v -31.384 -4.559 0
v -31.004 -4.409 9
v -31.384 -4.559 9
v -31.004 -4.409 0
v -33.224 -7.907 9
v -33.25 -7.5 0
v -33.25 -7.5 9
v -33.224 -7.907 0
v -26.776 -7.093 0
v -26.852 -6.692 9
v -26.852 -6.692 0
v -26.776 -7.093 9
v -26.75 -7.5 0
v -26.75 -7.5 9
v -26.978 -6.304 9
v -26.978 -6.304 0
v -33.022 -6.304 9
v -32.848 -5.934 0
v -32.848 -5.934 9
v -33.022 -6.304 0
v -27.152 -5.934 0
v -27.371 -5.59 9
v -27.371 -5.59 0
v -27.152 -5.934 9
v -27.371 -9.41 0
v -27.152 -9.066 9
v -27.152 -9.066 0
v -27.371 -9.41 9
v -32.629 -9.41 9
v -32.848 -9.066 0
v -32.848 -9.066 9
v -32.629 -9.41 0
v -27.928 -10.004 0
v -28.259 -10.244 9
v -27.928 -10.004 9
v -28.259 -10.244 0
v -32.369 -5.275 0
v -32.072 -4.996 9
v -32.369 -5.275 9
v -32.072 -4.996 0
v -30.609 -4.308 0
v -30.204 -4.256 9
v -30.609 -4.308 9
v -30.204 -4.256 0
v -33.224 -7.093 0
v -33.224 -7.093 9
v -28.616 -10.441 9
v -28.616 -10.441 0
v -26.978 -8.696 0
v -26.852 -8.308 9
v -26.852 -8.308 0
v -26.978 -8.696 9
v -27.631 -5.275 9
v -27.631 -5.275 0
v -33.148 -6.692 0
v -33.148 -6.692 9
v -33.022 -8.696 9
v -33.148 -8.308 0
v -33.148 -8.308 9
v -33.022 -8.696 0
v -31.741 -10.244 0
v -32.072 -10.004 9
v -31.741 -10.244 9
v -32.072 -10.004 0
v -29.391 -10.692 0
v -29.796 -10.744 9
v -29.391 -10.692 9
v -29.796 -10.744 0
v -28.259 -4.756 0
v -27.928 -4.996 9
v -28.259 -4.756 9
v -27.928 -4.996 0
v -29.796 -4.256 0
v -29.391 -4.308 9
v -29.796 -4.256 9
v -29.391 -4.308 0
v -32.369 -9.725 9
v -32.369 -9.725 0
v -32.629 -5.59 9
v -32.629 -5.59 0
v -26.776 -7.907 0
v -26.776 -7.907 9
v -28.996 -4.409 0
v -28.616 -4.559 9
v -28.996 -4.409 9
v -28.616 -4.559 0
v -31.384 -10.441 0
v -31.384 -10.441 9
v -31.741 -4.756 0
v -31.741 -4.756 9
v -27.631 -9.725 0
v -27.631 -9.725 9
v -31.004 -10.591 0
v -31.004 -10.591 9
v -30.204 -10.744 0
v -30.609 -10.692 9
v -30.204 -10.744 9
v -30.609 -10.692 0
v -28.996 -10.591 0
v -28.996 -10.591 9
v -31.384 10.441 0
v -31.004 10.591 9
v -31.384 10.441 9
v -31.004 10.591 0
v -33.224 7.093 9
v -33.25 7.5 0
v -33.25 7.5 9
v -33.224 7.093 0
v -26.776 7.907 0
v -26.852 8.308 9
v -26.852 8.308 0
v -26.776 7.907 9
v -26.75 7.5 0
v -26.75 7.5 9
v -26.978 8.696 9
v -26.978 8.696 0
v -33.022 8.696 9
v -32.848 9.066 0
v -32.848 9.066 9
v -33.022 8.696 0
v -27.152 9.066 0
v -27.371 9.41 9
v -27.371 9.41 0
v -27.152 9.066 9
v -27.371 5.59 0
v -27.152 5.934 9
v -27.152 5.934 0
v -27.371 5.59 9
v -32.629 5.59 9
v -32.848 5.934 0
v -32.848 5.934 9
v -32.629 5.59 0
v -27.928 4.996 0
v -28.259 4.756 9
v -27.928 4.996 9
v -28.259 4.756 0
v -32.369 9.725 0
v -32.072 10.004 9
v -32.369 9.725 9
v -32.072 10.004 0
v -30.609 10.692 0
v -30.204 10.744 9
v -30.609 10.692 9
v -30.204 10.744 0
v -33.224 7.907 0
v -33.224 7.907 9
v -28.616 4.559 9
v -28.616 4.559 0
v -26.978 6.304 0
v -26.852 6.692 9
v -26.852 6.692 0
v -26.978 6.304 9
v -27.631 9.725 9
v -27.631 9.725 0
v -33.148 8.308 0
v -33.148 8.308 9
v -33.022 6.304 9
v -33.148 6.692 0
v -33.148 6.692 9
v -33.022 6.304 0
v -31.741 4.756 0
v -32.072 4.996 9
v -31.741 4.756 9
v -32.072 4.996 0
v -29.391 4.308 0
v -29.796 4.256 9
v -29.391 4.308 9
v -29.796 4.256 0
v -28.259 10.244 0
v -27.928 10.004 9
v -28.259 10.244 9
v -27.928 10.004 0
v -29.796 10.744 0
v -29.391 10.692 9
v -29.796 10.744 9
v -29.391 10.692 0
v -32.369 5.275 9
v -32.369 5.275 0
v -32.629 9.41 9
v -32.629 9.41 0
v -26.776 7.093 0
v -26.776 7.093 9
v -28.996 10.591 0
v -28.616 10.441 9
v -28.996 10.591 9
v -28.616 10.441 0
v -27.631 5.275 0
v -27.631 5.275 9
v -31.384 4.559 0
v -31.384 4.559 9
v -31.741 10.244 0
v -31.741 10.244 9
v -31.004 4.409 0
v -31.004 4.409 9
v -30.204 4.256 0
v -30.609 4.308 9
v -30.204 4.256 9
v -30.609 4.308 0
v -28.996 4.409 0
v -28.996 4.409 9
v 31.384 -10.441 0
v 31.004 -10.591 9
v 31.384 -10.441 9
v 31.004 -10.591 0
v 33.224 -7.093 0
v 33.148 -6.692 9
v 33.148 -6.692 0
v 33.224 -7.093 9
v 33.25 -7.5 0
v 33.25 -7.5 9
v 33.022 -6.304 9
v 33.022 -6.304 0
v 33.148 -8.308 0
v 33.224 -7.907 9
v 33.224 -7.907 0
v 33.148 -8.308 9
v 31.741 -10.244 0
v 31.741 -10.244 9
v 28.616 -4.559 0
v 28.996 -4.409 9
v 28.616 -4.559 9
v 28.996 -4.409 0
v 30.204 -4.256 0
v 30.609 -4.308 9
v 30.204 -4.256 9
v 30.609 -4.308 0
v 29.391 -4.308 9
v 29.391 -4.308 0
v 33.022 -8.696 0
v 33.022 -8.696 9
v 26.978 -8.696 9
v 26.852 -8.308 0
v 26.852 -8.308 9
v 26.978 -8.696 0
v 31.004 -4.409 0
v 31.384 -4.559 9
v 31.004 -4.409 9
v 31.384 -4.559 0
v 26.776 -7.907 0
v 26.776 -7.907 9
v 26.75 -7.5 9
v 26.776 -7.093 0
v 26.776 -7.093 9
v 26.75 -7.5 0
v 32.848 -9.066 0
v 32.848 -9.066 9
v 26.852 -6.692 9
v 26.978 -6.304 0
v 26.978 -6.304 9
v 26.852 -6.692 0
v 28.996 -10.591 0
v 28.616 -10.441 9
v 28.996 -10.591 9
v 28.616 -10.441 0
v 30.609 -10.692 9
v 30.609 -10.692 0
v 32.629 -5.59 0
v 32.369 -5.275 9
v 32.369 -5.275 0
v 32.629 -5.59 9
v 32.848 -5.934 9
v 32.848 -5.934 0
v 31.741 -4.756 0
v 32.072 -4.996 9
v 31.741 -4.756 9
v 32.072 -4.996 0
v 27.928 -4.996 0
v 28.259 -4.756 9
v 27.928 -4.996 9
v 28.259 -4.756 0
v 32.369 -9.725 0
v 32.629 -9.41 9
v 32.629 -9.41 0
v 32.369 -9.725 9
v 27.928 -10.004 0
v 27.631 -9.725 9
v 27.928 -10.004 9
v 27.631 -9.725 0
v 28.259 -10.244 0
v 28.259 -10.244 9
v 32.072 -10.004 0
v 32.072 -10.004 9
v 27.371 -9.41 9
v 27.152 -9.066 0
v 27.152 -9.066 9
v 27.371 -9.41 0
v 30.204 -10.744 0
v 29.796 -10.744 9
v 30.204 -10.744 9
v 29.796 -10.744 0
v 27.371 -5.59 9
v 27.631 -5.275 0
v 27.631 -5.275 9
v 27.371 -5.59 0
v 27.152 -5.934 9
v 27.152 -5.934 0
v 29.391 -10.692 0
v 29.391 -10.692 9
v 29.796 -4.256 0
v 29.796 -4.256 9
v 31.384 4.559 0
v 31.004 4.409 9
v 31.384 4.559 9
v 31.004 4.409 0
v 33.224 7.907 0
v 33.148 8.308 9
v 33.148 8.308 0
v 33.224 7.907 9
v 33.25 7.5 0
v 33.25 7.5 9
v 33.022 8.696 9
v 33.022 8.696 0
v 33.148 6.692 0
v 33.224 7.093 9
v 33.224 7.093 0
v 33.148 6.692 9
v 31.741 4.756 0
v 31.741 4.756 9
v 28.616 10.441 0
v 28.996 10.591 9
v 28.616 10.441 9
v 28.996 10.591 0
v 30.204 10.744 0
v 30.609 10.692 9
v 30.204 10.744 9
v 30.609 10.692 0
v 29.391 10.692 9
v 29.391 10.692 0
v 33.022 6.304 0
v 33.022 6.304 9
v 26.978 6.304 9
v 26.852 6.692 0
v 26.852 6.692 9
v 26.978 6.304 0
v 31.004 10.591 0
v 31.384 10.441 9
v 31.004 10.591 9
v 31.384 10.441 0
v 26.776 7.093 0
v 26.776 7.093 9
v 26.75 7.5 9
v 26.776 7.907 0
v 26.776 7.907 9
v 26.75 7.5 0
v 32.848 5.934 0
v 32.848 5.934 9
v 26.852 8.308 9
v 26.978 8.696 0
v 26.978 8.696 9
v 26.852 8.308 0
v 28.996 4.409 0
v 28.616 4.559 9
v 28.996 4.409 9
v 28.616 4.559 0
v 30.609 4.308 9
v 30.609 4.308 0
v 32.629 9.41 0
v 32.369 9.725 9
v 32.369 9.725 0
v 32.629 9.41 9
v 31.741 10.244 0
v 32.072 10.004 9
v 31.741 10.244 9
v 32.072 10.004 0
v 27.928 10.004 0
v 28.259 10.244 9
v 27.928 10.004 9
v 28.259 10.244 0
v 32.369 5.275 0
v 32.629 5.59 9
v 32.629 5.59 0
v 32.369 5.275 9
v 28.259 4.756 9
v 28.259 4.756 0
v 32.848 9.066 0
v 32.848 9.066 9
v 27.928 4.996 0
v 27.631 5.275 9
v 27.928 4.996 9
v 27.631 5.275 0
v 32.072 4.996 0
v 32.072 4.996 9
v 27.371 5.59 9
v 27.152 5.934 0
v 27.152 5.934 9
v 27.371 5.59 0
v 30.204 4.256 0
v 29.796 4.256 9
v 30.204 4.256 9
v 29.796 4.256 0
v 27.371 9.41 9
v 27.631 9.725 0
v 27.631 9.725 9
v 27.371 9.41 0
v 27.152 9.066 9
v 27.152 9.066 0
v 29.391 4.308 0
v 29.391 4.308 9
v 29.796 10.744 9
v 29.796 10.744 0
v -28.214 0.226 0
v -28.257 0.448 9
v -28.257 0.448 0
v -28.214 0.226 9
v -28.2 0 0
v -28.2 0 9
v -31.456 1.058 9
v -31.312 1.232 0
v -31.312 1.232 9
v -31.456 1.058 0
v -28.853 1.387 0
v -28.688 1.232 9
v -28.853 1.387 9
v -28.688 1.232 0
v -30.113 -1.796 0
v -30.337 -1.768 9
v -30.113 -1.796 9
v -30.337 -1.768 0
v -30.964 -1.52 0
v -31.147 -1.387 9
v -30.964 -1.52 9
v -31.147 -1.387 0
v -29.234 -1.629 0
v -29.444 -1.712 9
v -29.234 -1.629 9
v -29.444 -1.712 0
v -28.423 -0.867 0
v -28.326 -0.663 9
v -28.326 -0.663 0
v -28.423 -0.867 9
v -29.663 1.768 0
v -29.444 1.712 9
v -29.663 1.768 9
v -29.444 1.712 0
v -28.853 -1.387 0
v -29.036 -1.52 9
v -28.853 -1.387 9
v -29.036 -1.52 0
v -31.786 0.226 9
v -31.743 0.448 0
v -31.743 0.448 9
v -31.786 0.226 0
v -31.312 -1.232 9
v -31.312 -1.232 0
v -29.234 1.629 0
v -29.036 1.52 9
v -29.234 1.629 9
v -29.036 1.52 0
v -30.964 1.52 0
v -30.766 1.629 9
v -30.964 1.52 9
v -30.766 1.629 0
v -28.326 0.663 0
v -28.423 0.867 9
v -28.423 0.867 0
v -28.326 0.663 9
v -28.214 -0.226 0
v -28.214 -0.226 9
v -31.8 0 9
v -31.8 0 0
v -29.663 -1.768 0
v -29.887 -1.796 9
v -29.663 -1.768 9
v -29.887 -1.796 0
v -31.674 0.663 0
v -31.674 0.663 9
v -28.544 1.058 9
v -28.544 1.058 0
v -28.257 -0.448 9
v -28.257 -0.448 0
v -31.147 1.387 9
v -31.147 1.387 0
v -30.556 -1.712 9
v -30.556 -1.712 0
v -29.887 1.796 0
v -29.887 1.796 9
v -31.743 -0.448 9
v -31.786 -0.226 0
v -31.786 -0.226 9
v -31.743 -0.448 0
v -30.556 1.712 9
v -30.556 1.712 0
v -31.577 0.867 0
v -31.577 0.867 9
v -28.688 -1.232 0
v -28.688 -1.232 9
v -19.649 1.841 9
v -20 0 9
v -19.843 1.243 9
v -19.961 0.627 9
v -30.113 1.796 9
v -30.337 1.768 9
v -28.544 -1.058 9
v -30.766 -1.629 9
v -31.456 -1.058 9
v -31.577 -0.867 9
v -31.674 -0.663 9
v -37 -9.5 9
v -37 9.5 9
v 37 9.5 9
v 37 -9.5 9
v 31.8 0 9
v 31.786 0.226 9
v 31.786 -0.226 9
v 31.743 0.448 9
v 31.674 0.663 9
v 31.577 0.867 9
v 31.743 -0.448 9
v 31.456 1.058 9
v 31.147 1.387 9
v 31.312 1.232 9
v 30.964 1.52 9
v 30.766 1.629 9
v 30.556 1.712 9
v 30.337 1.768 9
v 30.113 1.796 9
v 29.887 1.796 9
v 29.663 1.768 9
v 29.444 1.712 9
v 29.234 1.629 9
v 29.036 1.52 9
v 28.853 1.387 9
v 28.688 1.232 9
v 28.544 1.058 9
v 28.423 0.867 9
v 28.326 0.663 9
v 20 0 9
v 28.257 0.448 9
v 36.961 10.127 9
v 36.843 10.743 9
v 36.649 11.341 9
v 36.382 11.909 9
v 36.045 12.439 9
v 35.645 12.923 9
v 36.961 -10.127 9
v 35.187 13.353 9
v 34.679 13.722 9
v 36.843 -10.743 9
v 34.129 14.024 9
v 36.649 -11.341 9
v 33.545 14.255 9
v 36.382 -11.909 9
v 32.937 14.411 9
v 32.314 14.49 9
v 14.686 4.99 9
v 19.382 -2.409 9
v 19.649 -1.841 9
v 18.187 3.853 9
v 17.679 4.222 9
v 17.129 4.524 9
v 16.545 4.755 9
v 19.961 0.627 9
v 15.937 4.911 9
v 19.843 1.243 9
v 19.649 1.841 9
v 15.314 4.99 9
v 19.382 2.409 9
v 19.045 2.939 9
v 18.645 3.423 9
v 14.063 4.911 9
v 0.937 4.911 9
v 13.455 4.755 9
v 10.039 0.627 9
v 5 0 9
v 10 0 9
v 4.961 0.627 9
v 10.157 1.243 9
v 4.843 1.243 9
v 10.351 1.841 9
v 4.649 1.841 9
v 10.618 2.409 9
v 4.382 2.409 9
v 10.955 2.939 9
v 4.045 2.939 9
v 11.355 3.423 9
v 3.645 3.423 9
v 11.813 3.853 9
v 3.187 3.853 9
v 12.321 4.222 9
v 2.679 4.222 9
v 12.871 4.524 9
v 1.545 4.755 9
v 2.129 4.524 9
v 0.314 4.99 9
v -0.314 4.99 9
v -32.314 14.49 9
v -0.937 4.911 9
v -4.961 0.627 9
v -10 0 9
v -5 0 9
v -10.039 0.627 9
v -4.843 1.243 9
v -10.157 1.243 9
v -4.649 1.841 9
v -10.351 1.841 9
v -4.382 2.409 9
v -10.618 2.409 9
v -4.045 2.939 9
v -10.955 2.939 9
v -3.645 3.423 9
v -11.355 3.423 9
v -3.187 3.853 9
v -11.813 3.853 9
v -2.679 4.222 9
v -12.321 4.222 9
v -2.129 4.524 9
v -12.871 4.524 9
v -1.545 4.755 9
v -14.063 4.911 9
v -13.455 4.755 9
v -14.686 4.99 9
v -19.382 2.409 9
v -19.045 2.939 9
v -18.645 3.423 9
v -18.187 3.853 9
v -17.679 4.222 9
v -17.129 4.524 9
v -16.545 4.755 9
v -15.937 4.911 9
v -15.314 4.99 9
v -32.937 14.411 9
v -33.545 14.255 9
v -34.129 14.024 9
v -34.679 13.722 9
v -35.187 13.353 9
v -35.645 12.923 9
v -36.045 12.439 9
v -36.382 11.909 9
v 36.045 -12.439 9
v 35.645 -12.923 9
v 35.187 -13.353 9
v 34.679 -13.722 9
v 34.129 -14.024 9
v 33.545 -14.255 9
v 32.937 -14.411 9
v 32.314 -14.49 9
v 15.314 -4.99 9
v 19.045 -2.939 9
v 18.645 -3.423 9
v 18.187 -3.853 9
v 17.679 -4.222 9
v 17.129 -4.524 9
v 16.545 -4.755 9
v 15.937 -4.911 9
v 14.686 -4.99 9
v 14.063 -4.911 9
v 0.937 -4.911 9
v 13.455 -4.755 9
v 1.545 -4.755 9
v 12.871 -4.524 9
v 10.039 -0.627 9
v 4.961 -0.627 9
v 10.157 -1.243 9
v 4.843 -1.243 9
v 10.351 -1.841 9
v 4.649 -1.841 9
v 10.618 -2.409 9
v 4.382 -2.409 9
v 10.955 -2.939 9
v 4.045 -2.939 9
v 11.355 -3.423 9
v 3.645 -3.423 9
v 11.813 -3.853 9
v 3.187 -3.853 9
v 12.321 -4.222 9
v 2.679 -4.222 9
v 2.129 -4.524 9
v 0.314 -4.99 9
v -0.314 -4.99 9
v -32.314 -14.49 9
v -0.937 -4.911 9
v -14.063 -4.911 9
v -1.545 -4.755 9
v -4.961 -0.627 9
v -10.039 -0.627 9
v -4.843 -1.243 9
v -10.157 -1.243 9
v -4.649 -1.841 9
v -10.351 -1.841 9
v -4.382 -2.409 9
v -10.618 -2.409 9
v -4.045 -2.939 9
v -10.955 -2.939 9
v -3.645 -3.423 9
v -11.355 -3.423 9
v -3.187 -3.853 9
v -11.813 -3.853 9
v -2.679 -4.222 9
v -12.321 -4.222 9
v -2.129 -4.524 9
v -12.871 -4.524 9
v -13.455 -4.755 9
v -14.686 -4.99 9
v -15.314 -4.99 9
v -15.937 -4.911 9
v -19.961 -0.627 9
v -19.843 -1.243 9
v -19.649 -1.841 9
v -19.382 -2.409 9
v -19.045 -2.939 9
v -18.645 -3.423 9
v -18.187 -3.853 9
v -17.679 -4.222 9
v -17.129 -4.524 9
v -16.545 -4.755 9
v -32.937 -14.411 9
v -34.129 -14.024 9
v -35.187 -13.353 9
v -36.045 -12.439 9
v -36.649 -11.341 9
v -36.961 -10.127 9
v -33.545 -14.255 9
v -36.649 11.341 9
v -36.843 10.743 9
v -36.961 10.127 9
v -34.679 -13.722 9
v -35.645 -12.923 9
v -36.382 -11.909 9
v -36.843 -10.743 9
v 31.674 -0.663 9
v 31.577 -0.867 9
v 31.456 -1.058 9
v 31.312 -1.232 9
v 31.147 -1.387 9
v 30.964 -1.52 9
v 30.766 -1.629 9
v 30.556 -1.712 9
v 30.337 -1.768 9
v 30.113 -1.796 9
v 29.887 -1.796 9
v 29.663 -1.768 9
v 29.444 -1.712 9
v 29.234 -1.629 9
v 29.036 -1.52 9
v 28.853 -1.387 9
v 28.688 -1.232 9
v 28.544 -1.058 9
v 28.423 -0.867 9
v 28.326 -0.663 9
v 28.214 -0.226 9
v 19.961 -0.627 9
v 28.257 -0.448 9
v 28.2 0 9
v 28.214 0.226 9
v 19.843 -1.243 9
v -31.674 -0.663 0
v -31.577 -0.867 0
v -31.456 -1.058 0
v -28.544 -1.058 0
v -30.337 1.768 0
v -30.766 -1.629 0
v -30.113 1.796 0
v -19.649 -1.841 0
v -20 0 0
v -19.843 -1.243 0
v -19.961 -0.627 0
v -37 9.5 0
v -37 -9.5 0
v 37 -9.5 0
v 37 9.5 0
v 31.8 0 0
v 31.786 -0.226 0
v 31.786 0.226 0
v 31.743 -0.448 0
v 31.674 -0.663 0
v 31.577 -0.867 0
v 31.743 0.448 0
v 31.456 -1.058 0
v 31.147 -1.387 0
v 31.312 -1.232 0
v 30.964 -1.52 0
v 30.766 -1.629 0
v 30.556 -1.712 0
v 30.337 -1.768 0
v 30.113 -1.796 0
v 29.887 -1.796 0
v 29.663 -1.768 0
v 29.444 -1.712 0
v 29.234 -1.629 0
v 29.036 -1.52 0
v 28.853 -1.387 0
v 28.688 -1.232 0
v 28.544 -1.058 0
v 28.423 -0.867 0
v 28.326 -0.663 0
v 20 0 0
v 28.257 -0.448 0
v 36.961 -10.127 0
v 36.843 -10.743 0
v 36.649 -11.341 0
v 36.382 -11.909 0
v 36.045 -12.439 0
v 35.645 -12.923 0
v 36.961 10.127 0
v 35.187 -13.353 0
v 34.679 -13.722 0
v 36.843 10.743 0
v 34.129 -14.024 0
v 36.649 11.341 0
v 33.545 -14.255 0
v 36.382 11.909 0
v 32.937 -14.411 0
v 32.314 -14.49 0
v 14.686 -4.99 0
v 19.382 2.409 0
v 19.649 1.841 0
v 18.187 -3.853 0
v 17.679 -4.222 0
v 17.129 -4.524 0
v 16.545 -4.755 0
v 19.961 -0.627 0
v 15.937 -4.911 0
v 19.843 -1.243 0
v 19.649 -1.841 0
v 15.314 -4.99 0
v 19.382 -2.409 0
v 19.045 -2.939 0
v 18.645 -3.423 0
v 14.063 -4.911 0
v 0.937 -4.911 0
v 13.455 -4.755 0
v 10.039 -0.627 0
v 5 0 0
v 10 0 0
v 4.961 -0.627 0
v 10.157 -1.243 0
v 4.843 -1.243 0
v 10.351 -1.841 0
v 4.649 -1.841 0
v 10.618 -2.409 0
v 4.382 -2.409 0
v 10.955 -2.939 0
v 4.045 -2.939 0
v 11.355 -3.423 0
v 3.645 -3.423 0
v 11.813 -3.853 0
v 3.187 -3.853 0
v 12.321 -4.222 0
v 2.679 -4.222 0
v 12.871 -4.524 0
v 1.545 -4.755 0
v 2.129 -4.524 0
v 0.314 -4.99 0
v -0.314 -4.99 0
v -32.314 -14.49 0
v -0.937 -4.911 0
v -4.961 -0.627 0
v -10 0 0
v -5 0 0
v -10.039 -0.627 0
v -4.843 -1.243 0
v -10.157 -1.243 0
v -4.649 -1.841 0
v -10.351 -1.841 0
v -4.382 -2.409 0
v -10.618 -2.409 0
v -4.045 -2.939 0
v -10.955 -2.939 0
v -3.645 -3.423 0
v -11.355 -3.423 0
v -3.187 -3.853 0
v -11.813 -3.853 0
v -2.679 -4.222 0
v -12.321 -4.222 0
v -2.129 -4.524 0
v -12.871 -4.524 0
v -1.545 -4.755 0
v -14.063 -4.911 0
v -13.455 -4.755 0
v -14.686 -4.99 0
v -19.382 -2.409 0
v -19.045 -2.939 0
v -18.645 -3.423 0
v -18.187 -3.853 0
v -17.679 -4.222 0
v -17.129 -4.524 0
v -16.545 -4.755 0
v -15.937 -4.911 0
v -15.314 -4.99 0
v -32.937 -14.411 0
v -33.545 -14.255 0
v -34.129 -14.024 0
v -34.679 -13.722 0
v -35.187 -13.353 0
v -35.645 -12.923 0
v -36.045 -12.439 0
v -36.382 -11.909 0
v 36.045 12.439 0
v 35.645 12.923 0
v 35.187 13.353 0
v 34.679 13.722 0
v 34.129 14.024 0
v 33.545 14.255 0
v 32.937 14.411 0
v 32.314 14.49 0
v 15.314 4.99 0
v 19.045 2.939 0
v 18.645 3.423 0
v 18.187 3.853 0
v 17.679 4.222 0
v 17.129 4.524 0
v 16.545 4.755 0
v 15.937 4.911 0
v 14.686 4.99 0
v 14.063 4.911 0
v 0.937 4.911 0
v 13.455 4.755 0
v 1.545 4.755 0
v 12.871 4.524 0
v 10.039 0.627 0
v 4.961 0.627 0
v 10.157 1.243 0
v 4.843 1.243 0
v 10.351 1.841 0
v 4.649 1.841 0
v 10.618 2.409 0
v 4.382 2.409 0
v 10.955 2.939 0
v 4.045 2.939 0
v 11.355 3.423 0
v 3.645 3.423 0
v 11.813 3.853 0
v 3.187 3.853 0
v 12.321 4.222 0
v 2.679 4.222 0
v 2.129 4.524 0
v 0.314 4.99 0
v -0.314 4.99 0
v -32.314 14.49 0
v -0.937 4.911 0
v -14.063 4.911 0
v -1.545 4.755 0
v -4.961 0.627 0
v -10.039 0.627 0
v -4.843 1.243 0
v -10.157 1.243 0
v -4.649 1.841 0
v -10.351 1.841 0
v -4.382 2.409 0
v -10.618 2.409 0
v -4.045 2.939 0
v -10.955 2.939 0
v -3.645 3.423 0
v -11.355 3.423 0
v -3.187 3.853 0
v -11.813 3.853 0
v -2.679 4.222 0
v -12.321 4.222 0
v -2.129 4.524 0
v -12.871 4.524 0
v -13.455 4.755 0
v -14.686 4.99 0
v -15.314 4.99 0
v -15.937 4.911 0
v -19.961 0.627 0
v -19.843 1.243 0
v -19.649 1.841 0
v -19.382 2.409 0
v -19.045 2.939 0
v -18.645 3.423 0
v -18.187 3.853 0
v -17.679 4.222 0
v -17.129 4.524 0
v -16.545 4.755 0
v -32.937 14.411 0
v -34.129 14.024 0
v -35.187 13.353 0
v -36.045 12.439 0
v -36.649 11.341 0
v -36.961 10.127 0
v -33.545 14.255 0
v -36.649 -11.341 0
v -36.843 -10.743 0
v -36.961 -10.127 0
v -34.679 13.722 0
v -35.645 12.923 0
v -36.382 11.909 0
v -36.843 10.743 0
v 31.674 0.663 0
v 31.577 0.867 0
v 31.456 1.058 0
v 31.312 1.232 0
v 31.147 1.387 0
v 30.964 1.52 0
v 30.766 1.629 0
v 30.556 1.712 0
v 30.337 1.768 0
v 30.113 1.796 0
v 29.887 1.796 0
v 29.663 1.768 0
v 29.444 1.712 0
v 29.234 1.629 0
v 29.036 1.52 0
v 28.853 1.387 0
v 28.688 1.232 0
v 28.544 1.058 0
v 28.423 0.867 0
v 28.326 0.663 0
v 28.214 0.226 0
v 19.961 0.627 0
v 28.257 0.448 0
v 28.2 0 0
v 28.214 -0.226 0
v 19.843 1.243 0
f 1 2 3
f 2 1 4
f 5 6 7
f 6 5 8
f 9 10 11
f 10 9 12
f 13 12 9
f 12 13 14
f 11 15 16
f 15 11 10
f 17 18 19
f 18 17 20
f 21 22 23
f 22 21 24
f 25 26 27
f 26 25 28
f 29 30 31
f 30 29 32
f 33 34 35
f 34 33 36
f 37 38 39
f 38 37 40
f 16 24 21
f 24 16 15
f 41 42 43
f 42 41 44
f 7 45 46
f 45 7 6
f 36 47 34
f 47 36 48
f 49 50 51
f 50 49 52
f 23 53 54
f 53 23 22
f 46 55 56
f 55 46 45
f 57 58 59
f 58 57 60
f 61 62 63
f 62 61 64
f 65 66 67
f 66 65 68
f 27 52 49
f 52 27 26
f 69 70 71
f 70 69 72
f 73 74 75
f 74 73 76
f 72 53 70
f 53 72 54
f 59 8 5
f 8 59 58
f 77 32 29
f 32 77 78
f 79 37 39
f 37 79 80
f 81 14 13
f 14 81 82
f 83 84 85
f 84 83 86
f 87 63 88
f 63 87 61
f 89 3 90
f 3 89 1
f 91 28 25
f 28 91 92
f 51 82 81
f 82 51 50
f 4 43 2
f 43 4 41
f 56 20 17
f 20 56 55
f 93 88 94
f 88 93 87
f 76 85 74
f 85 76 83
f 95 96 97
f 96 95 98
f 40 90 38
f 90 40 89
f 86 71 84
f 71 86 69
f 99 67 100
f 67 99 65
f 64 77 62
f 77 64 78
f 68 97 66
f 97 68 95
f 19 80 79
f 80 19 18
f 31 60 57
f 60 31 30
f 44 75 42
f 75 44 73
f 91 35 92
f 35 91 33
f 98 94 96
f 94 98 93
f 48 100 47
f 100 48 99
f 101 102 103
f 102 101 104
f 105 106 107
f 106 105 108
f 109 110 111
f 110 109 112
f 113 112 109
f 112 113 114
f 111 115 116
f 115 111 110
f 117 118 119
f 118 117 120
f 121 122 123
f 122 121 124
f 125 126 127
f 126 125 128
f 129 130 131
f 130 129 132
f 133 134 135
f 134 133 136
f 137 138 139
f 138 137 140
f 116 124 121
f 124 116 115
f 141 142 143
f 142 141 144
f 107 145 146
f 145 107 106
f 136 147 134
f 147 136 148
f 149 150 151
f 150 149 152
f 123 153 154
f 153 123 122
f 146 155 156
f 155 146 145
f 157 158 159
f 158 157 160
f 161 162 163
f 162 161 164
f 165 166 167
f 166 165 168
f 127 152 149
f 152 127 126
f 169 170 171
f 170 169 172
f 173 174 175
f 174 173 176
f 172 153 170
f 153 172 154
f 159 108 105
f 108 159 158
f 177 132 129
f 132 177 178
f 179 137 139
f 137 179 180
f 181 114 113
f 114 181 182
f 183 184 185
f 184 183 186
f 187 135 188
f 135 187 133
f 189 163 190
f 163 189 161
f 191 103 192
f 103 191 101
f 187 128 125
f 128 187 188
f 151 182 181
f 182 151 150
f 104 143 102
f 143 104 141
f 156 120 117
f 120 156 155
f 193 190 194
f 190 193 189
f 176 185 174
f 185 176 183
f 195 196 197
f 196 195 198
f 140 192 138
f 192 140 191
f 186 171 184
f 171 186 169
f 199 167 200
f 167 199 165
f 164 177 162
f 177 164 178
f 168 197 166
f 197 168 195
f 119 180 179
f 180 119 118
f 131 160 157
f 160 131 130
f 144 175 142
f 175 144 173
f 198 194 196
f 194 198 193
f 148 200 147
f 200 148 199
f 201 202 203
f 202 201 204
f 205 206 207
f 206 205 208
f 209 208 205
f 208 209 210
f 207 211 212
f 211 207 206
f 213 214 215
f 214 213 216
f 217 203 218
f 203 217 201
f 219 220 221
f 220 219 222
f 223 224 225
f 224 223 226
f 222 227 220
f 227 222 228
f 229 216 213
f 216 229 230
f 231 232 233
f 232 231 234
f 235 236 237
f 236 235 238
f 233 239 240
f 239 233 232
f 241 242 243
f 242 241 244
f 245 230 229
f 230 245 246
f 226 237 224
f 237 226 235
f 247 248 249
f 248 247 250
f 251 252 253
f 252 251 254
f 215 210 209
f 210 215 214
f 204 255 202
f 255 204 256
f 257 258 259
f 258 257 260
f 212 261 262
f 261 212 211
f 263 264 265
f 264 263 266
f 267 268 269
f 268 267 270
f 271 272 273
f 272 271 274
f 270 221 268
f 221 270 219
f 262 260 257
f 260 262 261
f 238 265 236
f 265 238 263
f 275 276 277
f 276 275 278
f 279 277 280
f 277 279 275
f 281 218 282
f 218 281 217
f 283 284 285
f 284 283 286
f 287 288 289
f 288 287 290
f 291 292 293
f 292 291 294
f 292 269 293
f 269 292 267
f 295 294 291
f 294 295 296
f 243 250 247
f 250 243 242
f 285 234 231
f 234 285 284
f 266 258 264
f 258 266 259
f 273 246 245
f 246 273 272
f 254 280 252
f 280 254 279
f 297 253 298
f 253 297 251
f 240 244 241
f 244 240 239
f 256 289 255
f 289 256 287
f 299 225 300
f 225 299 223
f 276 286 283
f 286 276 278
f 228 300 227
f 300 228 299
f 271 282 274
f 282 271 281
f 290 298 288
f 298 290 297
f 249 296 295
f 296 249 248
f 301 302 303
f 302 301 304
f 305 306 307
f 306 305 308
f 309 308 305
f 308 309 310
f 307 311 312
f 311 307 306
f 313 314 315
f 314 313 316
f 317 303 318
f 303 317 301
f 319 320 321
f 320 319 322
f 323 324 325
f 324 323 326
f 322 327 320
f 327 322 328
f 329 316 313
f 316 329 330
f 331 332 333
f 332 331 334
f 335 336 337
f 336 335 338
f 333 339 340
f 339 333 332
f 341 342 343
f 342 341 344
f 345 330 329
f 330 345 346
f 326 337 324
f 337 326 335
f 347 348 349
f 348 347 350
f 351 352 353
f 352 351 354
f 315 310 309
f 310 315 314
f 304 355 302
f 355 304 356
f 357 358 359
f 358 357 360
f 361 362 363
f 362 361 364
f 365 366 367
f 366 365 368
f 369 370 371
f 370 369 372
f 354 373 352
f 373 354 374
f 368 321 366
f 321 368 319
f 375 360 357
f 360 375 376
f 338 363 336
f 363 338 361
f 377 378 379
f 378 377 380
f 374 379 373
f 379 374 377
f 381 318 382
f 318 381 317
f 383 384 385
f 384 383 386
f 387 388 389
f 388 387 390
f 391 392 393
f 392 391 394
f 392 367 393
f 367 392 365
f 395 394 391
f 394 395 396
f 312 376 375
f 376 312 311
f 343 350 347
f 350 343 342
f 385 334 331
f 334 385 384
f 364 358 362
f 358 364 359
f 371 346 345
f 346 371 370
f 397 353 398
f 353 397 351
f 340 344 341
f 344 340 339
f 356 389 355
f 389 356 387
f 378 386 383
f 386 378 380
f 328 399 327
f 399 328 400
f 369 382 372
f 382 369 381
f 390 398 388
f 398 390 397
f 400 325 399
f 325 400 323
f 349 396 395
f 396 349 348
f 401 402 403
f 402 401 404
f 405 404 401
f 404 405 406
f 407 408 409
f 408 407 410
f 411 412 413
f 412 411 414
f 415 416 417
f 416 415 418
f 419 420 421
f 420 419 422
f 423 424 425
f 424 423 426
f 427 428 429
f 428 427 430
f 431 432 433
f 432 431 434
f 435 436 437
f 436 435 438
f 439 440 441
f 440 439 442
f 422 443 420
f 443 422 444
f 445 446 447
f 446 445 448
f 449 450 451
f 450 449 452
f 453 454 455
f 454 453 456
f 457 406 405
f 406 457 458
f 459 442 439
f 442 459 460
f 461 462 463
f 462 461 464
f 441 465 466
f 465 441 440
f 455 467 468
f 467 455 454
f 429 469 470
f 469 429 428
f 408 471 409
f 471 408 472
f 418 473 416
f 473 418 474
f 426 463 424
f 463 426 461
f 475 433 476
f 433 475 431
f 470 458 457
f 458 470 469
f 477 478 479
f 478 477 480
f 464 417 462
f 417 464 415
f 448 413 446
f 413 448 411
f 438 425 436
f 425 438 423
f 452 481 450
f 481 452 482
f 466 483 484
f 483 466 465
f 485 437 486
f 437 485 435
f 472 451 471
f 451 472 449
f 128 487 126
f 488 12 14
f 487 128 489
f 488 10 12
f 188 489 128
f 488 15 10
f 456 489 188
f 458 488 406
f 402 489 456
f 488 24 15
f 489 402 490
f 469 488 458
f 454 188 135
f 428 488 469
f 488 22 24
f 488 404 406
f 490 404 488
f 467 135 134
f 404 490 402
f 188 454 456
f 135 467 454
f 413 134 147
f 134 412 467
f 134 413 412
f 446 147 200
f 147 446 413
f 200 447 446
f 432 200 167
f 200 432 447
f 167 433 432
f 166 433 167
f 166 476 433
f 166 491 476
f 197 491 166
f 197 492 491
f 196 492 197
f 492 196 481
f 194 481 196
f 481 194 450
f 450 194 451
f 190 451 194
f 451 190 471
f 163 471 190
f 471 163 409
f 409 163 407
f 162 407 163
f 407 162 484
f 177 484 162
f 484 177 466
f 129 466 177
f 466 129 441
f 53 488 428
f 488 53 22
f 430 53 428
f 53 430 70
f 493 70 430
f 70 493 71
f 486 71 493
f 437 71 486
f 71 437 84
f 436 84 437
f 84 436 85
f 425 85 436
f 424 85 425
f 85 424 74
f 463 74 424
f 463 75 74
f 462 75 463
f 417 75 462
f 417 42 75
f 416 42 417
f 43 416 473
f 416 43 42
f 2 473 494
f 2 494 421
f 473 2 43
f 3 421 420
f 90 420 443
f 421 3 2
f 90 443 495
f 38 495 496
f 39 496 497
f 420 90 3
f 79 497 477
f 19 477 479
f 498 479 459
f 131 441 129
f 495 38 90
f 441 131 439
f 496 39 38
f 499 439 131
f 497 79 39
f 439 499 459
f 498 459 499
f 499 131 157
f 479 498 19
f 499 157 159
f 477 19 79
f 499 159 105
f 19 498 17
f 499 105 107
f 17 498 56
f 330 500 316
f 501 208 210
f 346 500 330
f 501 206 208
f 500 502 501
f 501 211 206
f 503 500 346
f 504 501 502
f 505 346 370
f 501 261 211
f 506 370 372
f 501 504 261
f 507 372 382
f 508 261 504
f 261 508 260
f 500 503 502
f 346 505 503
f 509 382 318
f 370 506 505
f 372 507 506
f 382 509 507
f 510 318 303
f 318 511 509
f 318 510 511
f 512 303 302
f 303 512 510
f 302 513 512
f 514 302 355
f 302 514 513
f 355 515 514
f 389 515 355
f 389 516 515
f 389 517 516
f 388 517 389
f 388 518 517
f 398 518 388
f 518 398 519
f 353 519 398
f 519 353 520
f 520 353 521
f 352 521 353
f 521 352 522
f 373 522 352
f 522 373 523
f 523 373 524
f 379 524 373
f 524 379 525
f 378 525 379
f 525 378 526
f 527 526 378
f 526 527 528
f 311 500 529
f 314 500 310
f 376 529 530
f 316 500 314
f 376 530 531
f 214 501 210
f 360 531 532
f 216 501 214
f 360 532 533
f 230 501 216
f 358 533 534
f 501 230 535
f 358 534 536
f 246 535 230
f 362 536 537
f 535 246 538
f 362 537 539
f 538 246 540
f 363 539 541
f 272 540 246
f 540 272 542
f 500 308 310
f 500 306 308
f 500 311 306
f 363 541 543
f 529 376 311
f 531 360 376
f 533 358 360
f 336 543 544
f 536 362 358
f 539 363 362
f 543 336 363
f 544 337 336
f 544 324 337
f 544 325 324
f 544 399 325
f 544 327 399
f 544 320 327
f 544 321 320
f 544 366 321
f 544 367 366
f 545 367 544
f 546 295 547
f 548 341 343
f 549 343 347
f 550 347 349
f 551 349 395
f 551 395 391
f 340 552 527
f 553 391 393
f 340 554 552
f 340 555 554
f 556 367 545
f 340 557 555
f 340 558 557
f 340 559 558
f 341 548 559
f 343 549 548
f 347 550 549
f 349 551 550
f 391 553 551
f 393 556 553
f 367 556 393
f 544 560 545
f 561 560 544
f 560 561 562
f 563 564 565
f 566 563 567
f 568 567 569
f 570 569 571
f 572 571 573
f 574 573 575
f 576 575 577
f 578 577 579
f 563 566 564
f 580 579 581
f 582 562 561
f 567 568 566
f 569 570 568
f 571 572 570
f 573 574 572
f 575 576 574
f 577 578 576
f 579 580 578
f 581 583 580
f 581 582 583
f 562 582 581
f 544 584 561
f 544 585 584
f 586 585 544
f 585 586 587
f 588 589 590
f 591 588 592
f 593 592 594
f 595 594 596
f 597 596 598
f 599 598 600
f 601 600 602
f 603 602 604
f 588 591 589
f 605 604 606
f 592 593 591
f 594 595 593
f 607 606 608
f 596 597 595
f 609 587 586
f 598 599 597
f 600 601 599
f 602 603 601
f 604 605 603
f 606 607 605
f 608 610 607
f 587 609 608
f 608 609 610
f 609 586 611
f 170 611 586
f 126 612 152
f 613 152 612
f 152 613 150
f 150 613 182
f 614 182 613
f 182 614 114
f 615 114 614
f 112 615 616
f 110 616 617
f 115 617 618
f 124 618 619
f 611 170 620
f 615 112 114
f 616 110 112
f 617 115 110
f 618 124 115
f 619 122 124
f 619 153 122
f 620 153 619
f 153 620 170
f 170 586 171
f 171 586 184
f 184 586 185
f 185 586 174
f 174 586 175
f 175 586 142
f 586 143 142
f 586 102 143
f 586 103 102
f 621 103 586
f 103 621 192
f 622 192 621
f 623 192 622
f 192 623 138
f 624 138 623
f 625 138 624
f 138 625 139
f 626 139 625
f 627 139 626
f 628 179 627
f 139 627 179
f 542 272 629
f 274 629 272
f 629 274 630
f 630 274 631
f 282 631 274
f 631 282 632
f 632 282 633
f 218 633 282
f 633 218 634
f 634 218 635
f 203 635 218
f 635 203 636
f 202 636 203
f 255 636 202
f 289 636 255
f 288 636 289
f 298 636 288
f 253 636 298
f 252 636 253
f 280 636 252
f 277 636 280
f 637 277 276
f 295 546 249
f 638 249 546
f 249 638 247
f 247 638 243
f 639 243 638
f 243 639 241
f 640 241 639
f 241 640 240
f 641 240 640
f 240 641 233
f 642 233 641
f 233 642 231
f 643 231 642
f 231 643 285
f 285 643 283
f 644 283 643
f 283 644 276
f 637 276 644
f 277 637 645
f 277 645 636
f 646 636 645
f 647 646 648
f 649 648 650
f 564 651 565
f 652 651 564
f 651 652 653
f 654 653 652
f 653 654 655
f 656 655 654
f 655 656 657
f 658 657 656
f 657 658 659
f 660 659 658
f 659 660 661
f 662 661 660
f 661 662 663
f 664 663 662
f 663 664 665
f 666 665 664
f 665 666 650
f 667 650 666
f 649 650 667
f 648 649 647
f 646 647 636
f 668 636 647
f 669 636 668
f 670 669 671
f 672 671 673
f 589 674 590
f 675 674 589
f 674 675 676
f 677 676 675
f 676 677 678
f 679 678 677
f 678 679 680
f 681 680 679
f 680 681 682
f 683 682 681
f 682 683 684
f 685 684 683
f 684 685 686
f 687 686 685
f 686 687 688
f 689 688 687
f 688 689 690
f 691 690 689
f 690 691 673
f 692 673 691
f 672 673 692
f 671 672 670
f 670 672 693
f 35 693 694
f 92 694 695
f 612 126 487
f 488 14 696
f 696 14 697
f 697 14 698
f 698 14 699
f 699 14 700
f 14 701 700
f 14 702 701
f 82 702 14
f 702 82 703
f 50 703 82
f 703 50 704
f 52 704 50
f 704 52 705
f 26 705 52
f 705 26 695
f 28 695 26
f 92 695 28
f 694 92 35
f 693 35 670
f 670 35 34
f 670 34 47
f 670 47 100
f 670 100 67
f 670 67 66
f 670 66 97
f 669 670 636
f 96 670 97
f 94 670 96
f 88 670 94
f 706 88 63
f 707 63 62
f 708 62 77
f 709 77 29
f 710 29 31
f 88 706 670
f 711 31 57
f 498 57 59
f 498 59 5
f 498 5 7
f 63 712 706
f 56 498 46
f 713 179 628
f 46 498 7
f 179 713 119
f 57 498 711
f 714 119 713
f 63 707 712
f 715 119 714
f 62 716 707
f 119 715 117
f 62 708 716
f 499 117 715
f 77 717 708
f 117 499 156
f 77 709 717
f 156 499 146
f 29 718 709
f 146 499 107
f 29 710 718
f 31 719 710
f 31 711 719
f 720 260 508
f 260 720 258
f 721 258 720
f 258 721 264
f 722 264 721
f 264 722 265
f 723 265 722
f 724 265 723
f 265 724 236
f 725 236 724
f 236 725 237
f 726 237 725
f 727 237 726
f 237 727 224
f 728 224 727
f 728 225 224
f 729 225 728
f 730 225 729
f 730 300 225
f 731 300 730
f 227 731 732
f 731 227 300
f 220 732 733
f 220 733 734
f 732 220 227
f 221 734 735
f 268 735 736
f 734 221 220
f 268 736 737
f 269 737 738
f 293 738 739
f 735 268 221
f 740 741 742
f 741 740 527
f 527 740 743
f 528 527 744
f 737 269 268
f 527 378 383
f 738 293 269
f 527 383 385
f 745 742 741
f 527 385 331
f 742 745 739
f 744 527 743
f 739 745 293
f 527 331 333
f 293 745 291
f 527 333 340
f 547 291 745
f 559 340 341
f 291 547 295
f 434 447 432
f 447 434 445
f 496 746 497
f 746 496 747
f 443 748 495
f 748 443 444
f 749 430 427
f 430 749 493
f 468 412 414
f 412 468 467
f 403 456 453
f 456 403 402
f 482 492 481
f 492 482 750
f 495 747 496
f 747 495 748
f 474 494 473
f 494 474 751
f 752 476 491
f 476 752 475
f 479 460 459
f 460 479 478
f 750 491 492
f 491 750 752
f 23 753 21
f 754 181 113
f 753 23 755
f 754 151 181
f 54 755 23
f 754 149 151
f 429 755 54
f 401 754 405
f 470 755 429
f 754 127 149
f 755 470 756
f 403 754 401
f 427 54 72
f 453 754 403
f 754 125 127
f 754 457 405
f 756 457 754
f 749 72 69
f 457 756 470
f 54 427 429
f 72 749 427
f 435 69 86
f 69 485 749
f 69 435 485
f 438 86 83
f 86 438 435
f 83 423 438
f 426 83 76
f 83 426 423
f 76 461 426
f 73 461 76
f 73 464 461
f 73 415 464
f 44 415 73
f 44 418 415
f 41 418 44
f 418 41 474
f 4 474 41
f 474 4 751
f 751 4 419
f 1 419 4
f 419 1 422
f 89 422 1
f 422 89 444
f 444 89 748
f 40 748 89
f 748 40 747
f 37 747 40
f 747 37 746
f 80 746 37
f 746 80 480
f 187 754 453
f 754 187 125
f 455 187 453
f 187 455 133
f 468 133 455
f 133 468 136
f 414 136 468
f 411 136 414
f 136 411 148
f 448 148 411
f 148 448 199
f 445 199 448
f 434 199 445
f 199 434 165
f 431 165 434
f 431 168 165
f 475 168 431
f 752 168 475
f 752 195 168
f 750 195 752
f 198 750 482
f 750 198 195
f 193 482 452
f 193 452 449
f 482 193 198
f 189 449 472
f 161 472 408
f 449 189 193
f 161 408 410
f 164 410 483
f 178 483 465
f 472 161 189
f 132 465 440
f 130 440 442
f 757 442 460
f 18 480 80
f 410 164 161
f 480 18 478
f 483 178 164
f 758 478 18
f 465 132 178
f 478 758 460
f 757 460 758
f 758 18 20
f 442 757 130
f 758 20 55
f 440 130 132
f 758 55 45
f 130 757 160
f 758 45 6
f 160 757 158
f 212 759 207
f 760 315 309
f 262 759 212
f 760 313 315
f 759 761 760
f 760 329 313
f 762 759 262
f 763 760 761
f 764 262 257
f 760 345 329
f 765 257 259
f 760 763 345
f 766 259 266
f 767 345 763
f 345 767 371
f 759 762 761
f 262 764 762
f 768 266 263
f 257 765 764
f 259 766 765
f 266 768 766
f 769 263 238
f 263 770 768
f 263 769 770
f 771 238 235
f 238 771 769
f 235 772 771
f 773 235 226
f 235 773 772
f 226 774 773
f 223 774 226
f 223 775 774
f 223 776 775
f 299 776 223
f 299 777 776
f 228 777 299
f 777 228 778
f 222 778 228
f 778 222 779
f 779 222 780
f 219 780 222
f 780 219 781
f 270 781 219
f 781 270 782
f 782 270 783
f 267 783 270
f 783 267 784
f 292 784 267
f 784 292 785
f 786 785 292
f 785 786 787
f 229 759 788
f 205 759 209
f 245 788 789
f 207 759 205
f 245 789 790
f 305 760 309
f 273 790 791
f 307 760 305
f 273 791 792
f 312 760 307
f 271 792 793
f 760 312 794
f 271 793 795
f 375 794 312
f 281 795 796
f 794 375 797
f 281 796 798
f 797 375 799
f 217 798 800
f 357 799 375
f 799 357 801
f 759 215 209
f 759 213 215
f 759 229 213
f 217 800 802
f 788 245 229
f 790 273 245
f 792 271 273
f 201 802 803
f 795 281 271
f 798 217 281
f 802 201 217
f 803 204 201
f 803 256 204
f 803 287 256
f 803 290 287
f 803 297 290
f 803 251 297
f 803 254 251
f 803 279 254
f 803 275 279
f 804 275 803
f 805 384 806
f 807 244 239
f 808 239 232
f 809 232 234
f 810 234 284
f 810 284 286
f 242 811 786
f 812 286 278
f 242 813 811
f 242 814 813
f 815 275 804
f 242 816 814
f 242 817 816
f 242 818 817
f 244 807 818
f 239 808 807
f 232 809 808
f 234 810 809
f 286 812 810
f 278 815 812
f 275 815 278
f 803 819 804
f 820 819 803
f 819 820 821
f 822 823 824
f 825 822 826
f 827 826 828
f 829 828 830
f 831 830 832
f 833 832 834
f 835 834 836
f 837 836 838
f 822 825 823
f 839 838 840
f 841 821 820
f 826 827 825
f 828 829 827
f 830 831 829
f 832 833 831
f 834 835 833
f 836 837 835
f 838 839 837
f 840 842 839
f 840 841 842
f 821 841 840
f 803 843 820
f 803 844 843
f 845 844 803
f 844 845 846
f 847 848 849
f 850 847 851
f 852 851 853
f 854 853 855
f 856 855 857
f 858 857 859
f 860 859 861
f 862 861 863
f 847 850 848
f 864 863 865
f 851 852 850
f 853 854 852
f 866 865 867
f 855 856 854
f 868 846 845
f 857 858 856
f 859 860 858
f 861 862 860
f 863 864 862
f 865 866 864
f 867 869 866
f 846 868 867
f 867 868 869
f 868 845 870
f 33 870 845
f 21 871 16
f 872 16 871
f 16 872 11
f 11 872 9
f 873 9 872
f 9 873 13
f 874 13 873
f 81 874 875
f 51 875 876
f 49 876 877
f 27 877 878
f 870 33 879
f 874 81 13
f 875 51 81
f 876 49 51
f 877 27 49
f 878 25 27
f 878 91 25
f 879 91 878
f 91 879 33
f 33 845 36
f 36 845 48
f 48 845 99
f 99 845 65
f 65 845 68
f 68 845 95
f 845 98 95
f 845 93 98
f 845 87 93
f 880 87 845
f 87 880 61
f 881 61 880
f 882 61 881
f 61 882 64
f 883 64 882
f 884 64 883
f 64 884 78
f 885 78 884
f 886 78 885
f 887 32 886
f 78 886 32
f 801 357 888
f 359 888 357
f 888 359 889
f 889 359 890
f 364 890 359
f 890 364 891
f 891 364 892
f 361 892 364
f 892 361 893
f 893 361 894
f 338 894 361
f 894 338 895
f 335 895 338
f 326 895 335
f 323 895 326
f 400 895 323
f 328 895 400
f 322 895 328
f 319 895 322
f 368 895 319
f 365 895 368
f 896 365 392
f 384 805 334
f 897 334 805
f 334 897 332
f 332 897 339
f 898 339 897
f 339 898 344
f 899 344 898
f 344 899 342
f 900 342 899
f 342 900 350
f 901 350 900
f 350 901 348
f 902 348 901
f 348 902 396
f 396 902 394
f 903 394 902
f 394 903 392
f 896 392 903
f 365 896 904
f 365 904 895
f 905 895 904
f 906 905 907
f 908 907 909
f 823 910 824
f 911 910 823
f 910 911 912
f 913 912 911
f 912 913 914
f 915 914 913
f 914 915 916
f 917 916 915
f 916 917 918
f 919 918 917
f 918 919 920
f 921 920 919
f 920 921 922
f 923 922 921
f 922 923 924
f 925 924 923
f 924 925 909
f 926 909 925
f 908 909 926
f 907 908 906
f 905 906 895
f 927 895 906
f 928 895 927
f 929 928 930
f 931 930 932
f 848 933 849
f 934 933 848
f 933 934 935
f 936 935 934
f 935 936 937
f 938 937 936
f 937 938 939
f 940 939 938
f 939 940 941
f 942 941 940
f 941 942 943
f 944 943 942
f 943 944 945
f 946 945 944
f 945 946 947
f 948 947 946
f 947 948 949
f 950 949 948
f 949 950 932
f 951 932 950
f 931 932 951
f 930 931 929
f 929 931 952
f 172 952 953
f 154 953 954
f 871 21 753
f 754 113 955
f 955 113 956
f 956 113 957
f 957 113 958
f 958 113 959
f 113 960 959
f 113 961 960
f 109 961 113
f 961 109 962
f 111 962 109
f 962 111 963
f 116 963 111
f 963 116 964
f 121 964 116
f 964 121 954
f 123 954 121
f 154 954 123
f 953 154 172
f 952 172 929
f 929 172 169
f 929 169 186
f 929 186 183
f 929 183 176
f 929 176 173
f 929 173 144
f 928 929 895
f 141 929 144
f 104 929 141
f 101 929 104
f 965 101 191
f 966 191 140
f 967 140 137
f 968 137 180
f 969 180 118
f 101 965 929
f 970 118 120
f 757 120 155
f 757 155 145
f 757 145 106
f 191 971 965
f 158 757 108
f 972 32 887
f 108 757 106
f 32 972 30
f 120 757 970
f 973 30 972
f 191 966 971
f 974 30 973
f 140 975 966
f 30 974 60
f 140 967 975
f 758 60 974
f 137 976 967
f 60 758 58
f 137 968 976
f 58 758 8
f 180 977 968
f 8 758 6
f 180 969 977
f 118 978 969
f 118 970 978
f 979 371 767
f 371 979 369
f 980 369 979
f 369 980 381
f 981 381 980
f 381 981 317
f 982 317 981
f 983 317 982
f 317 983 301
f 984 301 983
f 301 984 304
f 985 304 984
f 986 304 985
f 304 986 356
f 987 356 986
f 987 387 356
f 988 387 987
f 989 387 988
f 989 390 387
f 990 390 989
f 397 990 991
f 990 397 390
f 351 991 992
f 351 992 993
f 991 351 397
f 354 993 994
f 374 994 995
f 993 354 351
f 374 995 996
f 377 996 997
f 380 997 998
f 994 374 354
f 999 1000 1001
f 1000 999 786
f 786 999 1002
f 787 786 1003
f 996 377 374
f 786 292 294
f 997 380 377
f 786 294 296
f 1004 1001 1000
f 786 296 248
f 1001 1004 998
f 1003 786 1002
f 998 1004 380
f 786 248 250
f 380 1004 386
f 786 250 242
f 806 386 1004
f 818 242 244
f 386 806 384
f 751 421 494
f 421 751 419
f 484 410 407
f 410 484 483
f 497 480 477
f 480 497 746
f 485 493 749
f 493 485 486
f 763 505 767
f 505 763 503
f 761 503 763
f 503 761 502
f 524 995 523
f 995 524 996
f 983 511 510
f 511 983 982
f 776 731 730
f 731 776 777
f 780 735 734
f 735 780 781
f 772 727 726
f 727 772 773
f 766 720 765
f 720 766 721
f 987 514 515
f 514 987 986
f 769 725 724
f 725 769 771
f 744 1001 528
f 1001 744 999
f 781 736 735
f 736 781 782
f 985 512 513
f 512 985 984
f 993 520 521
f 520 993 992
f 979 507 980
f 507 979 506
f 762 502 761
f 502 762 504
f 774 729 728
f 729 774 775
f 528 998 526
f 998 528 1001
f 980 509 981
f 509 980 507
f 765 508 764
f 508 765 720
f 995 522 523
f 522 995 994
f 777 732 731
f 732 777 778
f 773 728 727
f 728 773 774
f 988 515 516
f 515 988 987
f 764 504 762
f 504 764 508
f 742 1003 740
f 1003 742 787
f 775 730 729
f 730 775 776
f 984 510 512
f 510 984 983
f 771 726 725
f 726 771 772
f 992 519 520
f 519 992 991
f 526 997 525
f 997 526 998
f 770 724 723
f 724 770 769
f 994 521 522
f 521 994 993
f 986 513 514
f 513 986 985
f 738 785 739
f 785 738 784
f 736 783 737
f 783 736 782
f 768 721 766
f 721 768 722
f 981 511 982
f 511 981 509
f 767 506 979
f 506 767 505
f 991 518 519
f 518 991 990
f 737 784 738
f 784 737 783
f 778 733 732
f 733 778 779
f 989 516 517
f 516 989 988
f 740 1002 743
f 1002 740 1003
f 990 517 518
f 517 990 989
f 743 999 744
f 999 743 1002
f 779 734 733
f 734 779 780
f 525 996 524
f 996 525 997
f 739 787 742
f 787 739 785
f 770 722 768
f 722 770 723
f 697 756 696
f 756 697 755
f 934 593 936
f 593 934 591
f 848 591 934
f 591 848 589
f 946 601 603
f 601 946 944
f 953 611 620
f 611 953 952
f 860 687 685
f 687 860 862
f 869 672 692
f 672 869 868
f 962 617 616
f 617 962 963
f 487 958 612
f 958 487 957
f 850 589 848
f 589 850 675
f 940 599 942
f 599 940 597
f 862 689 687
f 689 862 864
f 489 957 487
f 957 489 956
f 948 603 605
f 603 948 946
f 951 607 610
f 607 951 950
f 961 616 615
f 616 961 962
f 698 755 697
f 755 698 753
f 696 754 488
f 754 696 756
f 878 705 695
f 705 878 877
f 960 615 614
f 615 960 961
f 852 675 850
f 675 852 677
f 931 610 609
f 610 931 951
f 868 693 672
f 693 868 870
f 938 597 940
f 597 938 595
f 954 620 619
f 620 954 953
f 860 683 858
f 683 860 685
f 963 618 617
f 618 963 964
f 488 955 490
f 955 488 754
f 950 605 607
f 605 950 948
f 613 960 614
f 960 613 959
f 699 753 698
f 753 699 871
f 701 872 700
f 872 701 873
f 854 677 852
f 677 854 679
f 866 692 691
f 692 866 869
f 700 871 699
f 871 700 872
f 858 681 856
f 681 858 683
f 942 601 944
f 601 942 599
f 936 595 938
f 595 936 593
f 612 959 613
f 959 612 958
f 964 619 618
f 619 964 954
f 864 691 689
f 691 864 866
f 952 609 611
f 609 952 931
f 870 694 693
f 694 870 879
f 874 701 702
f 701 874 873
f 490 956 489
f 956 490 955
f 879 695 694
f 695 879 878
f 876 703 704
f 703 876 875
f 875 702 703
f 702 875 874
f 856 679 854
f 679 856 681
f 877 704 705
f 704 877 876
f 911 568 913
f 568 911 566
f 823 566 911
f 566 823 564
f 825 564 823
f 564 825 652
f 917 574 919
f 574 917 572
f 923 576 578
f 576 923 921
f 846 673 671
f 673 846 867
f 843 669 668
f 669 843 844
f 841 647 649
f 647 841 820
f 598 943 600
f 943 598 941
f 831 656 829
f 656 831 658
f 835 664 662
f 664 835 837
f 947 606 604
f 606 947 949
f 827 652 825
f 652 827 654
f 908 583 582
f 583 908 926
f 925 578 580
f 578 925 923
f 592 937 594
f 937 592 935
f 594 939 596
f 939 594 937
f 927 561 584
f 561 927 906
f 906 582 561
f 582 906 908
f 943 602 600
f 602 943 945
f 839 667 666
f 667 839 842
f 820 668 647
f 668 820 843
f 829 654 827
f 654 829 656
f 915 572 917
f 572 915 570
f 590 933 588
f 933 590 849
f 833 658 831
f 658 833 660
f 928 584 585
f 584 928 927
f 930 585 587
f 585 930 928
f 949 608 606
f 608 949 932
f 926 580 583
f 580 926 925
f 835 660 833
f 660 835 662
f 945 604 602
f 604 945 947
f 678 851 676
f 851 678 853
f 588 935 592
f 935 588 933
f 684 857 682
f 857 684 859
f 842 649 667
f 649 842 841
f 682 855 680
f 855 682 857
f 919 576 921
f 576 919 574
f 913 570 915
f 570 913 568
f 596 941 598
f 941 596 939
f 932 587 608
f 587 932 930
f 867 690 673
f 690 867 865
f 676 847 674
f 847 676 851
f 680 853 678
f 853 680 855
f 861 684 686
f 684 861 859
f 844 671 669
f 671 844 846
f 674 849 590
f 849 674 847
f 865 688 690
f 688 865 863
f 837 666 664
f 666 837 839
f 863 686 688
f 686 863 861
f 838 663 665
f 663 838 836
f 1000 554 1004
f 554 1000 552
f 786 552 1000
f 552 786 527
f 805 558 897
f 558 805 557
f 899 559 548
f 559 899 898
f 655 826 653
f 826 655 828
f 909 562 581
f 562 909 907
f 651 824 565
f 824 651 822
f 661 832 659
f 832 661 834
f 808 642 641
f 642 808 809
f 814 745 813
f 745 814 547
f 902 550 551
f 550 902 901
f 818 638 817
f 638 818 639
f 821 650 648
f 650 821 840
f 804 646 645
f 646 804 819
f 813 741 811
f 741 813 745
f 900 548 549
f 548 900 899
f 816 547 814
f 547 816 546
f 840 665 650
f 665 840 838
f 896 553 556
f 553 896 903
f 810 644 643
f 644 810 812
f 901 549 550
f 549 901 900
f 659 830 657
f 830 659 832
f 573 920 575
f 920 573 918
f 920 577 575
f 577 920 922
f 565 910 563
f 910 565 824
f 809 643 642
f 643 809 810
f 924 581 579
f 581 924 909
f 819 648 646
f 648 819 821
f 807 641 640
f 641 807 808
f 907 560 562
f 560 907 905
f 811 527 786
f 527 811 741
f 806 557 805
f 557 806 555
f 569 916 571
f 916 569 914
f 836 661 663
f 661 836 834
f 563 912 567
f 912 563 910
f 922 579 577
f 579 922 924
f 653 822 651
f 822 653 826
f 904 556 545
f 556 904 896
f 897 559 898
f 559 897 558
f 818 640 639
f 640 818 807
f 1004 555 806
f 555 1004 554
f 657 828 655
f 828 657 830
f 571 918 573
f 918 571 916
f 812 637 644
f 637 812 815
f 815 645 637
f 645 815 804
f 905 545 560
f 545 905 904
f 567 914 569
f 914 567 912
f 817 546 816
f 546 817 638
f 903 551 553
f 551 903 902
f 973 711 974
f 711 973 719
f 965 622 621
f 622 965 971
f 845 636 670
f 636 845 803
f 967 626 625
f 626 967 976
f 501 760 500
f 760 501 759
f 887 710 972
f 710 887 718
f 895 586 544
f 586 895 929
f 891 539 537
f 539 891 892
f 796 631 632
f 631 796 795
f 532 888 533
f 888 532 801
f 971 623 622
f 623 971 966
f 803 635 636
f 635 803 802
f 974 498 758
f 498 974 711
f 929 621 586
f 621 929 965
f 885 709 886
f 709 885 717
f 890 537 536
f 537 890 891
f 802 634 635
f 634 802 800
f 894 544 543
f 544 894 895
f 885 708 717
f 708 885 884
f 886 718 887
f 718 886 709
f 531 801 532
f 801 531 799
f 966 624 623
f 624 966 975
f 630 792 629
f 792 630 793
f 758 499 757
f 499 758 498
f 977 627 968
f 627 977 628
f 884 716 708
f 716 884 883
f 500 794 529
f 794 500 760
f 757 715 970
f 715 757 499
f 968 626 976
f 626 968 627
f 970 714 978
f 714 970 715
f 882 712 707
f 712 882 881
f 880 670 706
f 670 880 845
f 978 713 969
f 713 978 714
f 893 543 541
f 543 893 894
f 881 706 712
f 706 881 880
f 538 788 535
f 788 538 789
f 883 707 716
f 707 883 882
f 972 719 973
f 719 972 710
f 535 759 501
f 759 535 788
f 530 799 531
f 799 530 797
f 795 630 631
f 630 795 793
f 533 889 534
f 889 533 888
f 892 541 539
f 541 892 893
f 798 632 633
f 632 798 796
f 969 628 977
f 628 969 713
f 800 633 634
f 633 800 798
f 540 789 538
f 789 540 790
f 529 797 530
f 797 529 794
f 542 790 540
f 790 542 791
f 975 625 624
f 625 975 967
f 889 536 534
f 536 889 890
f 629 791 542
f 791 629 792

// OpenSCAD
$fn = 50;


difference() {
	union() {
		hull() {
			translate(v = [-32.0000000000, 9.5000000000, 0]) {
				cylinder(h = 9, r = 5);
			}
			translate(v = [32.0000000000, 9.5000000000, 0]) {
				cylinder(h = 9, r = 5);
			}
			translate(v = [-32.0000000000, -9.5000000000, 0]) {
				cylinder(h = 9, r = 5);
			}
			translate(v = [32.0000000000, -9.5000000000, 0]) {
				cylinder(h = 9, r = 5);
			}
		}
	}
	union() {
		#translate(v = [-30.0000000000, -7.5000000000, 0]) {
			cylinder(h = 9, r = 3.2500000000);
		}
		#translate(v = [-30.0000000000, 7.5000000000, 0]) {
			cylinder(h = 9, r = 3.2500000000);
		}
		#translate(v = [30.0000000000, -7.5000000000, 0]) {
			cylinder(h = 9, r = 3.2500000000);
		}
		#translate(v = [30.0000000000, 7.5000000000, 0]) {
			cylinder(h = 9, r = 3.2500000000);
		}
		#translate(v = [-30.0000000000, -7.5000000000, -100.0000000000]) {
			cylinder(h = 200, r = 3.2500000000);
		}
		#translate(v = [-30.0000000000, 7.5000000000, -100.0000000000]) {
			cylinder(h = 200, r = 3.2500000000);
		}
		#translate(v = [30.0000000000, -7.5000000000, -100.0000000000]) {
			cylinder(h = 200, r = 3.2500000000);
		}
		#translate(v = [30.0000000000, 7.5000000000, -100.0000000000]) {
			cylinder(h = 200, r = 3.2500000000);
		}
		#translate(v = [-30.0000000000, -7.5000000000, 0]) {
			cylinder(h = 9, r = 1.8000000000);
		}
		#translate(v = [-30.0000000000, 0.0000000000, 0]) {
			cylinder(h = 9, r = 1.8000000000);
		}
		#translate(v = [-30.0000000000, 7.5000000000, 0]) {
			cylinder(h = 9, r = 1.8000000000);
		}
		#translate(v = [30.0000000000, -7.5000000000, 0]) {
			cylinder(h = 9, r = 1.8000000000);
		}
		#translate(v = [30.0000000000, 0.0000000000, 0]) {
			cylinder(h = 9, r = 1.8000000000);
		}
		#translate(v = [30.0000000000, 7.5000000000, 0]) {
			cylinder(h = 9, r = 1.8000000000);
		}
		#translate(v = [-30.0000000000, -7.5000000000, 0]) {
			cylinder(h = 9, r = 1.8000000000);
		}
		#translate(v = [-30.0000000000, 0.0000000000, 0]) {
			cylinder(h = 9, r = 1.8000000000);
		}
		#translate(v = [-30.0000000000, 7.5000000000, 0]) {
			cylinder(h = 9, r = 1.8000000000);
		}
		#translate(v = [30.0000000000, -7.5000000000, 0]) {
			cylinder(h = 9, r = 1.8000000000);
		}
		#translate(v = [30.0000000000, 0.0000000000, 0]) {
			cylinder(h = 9, r = 1.8000000000);
		}
		#translate(v = [30.0000000000, 7.5000000000, 0]) {
			cylinder(h = 9, r = 1.8000000000);
		}
		#translate(v = [-30.0000000000, -7.5000000000, 0]) {
			cylinder(h = 9, r = 1.8000000000);
		}
		#translate(v = [-30.0000000000, 0.0000000000, 0]) {
			cylinder(h = 9, r = 1.8000000000);
		}
		#translate(v = [-30.0000000000, 7.5000000000, 0]) {
			cylinder(h = 9, r = 1.8000000000);
		}
		#translate(v = [30.0000000000, -7.5000000000, 0]) {
			cylinder(h = 9, r = 1.8000000000);
		}
		#translate(v = [30.0000000000, 0.0000000000, 0]) {
			cylinder(h = 9, r = 1.8000000000);
		}
		#translate(v = [30.0000000000, 7.5000000000, 0]) {
			cylinder(h = 9, r = 1.8000000000);
		}
		#translate(v = [-15.0000000000, 0, 0]) {
			cylinder(h = 9, r = 5.0000000000);
		}
		#cylinder(h = 9, r = 5.0000000000);
		#translate(v = [15.0000000000, 0, 0]) {
			cylinder(h = 9, r = 5.0000000000);
		}
	}
}
